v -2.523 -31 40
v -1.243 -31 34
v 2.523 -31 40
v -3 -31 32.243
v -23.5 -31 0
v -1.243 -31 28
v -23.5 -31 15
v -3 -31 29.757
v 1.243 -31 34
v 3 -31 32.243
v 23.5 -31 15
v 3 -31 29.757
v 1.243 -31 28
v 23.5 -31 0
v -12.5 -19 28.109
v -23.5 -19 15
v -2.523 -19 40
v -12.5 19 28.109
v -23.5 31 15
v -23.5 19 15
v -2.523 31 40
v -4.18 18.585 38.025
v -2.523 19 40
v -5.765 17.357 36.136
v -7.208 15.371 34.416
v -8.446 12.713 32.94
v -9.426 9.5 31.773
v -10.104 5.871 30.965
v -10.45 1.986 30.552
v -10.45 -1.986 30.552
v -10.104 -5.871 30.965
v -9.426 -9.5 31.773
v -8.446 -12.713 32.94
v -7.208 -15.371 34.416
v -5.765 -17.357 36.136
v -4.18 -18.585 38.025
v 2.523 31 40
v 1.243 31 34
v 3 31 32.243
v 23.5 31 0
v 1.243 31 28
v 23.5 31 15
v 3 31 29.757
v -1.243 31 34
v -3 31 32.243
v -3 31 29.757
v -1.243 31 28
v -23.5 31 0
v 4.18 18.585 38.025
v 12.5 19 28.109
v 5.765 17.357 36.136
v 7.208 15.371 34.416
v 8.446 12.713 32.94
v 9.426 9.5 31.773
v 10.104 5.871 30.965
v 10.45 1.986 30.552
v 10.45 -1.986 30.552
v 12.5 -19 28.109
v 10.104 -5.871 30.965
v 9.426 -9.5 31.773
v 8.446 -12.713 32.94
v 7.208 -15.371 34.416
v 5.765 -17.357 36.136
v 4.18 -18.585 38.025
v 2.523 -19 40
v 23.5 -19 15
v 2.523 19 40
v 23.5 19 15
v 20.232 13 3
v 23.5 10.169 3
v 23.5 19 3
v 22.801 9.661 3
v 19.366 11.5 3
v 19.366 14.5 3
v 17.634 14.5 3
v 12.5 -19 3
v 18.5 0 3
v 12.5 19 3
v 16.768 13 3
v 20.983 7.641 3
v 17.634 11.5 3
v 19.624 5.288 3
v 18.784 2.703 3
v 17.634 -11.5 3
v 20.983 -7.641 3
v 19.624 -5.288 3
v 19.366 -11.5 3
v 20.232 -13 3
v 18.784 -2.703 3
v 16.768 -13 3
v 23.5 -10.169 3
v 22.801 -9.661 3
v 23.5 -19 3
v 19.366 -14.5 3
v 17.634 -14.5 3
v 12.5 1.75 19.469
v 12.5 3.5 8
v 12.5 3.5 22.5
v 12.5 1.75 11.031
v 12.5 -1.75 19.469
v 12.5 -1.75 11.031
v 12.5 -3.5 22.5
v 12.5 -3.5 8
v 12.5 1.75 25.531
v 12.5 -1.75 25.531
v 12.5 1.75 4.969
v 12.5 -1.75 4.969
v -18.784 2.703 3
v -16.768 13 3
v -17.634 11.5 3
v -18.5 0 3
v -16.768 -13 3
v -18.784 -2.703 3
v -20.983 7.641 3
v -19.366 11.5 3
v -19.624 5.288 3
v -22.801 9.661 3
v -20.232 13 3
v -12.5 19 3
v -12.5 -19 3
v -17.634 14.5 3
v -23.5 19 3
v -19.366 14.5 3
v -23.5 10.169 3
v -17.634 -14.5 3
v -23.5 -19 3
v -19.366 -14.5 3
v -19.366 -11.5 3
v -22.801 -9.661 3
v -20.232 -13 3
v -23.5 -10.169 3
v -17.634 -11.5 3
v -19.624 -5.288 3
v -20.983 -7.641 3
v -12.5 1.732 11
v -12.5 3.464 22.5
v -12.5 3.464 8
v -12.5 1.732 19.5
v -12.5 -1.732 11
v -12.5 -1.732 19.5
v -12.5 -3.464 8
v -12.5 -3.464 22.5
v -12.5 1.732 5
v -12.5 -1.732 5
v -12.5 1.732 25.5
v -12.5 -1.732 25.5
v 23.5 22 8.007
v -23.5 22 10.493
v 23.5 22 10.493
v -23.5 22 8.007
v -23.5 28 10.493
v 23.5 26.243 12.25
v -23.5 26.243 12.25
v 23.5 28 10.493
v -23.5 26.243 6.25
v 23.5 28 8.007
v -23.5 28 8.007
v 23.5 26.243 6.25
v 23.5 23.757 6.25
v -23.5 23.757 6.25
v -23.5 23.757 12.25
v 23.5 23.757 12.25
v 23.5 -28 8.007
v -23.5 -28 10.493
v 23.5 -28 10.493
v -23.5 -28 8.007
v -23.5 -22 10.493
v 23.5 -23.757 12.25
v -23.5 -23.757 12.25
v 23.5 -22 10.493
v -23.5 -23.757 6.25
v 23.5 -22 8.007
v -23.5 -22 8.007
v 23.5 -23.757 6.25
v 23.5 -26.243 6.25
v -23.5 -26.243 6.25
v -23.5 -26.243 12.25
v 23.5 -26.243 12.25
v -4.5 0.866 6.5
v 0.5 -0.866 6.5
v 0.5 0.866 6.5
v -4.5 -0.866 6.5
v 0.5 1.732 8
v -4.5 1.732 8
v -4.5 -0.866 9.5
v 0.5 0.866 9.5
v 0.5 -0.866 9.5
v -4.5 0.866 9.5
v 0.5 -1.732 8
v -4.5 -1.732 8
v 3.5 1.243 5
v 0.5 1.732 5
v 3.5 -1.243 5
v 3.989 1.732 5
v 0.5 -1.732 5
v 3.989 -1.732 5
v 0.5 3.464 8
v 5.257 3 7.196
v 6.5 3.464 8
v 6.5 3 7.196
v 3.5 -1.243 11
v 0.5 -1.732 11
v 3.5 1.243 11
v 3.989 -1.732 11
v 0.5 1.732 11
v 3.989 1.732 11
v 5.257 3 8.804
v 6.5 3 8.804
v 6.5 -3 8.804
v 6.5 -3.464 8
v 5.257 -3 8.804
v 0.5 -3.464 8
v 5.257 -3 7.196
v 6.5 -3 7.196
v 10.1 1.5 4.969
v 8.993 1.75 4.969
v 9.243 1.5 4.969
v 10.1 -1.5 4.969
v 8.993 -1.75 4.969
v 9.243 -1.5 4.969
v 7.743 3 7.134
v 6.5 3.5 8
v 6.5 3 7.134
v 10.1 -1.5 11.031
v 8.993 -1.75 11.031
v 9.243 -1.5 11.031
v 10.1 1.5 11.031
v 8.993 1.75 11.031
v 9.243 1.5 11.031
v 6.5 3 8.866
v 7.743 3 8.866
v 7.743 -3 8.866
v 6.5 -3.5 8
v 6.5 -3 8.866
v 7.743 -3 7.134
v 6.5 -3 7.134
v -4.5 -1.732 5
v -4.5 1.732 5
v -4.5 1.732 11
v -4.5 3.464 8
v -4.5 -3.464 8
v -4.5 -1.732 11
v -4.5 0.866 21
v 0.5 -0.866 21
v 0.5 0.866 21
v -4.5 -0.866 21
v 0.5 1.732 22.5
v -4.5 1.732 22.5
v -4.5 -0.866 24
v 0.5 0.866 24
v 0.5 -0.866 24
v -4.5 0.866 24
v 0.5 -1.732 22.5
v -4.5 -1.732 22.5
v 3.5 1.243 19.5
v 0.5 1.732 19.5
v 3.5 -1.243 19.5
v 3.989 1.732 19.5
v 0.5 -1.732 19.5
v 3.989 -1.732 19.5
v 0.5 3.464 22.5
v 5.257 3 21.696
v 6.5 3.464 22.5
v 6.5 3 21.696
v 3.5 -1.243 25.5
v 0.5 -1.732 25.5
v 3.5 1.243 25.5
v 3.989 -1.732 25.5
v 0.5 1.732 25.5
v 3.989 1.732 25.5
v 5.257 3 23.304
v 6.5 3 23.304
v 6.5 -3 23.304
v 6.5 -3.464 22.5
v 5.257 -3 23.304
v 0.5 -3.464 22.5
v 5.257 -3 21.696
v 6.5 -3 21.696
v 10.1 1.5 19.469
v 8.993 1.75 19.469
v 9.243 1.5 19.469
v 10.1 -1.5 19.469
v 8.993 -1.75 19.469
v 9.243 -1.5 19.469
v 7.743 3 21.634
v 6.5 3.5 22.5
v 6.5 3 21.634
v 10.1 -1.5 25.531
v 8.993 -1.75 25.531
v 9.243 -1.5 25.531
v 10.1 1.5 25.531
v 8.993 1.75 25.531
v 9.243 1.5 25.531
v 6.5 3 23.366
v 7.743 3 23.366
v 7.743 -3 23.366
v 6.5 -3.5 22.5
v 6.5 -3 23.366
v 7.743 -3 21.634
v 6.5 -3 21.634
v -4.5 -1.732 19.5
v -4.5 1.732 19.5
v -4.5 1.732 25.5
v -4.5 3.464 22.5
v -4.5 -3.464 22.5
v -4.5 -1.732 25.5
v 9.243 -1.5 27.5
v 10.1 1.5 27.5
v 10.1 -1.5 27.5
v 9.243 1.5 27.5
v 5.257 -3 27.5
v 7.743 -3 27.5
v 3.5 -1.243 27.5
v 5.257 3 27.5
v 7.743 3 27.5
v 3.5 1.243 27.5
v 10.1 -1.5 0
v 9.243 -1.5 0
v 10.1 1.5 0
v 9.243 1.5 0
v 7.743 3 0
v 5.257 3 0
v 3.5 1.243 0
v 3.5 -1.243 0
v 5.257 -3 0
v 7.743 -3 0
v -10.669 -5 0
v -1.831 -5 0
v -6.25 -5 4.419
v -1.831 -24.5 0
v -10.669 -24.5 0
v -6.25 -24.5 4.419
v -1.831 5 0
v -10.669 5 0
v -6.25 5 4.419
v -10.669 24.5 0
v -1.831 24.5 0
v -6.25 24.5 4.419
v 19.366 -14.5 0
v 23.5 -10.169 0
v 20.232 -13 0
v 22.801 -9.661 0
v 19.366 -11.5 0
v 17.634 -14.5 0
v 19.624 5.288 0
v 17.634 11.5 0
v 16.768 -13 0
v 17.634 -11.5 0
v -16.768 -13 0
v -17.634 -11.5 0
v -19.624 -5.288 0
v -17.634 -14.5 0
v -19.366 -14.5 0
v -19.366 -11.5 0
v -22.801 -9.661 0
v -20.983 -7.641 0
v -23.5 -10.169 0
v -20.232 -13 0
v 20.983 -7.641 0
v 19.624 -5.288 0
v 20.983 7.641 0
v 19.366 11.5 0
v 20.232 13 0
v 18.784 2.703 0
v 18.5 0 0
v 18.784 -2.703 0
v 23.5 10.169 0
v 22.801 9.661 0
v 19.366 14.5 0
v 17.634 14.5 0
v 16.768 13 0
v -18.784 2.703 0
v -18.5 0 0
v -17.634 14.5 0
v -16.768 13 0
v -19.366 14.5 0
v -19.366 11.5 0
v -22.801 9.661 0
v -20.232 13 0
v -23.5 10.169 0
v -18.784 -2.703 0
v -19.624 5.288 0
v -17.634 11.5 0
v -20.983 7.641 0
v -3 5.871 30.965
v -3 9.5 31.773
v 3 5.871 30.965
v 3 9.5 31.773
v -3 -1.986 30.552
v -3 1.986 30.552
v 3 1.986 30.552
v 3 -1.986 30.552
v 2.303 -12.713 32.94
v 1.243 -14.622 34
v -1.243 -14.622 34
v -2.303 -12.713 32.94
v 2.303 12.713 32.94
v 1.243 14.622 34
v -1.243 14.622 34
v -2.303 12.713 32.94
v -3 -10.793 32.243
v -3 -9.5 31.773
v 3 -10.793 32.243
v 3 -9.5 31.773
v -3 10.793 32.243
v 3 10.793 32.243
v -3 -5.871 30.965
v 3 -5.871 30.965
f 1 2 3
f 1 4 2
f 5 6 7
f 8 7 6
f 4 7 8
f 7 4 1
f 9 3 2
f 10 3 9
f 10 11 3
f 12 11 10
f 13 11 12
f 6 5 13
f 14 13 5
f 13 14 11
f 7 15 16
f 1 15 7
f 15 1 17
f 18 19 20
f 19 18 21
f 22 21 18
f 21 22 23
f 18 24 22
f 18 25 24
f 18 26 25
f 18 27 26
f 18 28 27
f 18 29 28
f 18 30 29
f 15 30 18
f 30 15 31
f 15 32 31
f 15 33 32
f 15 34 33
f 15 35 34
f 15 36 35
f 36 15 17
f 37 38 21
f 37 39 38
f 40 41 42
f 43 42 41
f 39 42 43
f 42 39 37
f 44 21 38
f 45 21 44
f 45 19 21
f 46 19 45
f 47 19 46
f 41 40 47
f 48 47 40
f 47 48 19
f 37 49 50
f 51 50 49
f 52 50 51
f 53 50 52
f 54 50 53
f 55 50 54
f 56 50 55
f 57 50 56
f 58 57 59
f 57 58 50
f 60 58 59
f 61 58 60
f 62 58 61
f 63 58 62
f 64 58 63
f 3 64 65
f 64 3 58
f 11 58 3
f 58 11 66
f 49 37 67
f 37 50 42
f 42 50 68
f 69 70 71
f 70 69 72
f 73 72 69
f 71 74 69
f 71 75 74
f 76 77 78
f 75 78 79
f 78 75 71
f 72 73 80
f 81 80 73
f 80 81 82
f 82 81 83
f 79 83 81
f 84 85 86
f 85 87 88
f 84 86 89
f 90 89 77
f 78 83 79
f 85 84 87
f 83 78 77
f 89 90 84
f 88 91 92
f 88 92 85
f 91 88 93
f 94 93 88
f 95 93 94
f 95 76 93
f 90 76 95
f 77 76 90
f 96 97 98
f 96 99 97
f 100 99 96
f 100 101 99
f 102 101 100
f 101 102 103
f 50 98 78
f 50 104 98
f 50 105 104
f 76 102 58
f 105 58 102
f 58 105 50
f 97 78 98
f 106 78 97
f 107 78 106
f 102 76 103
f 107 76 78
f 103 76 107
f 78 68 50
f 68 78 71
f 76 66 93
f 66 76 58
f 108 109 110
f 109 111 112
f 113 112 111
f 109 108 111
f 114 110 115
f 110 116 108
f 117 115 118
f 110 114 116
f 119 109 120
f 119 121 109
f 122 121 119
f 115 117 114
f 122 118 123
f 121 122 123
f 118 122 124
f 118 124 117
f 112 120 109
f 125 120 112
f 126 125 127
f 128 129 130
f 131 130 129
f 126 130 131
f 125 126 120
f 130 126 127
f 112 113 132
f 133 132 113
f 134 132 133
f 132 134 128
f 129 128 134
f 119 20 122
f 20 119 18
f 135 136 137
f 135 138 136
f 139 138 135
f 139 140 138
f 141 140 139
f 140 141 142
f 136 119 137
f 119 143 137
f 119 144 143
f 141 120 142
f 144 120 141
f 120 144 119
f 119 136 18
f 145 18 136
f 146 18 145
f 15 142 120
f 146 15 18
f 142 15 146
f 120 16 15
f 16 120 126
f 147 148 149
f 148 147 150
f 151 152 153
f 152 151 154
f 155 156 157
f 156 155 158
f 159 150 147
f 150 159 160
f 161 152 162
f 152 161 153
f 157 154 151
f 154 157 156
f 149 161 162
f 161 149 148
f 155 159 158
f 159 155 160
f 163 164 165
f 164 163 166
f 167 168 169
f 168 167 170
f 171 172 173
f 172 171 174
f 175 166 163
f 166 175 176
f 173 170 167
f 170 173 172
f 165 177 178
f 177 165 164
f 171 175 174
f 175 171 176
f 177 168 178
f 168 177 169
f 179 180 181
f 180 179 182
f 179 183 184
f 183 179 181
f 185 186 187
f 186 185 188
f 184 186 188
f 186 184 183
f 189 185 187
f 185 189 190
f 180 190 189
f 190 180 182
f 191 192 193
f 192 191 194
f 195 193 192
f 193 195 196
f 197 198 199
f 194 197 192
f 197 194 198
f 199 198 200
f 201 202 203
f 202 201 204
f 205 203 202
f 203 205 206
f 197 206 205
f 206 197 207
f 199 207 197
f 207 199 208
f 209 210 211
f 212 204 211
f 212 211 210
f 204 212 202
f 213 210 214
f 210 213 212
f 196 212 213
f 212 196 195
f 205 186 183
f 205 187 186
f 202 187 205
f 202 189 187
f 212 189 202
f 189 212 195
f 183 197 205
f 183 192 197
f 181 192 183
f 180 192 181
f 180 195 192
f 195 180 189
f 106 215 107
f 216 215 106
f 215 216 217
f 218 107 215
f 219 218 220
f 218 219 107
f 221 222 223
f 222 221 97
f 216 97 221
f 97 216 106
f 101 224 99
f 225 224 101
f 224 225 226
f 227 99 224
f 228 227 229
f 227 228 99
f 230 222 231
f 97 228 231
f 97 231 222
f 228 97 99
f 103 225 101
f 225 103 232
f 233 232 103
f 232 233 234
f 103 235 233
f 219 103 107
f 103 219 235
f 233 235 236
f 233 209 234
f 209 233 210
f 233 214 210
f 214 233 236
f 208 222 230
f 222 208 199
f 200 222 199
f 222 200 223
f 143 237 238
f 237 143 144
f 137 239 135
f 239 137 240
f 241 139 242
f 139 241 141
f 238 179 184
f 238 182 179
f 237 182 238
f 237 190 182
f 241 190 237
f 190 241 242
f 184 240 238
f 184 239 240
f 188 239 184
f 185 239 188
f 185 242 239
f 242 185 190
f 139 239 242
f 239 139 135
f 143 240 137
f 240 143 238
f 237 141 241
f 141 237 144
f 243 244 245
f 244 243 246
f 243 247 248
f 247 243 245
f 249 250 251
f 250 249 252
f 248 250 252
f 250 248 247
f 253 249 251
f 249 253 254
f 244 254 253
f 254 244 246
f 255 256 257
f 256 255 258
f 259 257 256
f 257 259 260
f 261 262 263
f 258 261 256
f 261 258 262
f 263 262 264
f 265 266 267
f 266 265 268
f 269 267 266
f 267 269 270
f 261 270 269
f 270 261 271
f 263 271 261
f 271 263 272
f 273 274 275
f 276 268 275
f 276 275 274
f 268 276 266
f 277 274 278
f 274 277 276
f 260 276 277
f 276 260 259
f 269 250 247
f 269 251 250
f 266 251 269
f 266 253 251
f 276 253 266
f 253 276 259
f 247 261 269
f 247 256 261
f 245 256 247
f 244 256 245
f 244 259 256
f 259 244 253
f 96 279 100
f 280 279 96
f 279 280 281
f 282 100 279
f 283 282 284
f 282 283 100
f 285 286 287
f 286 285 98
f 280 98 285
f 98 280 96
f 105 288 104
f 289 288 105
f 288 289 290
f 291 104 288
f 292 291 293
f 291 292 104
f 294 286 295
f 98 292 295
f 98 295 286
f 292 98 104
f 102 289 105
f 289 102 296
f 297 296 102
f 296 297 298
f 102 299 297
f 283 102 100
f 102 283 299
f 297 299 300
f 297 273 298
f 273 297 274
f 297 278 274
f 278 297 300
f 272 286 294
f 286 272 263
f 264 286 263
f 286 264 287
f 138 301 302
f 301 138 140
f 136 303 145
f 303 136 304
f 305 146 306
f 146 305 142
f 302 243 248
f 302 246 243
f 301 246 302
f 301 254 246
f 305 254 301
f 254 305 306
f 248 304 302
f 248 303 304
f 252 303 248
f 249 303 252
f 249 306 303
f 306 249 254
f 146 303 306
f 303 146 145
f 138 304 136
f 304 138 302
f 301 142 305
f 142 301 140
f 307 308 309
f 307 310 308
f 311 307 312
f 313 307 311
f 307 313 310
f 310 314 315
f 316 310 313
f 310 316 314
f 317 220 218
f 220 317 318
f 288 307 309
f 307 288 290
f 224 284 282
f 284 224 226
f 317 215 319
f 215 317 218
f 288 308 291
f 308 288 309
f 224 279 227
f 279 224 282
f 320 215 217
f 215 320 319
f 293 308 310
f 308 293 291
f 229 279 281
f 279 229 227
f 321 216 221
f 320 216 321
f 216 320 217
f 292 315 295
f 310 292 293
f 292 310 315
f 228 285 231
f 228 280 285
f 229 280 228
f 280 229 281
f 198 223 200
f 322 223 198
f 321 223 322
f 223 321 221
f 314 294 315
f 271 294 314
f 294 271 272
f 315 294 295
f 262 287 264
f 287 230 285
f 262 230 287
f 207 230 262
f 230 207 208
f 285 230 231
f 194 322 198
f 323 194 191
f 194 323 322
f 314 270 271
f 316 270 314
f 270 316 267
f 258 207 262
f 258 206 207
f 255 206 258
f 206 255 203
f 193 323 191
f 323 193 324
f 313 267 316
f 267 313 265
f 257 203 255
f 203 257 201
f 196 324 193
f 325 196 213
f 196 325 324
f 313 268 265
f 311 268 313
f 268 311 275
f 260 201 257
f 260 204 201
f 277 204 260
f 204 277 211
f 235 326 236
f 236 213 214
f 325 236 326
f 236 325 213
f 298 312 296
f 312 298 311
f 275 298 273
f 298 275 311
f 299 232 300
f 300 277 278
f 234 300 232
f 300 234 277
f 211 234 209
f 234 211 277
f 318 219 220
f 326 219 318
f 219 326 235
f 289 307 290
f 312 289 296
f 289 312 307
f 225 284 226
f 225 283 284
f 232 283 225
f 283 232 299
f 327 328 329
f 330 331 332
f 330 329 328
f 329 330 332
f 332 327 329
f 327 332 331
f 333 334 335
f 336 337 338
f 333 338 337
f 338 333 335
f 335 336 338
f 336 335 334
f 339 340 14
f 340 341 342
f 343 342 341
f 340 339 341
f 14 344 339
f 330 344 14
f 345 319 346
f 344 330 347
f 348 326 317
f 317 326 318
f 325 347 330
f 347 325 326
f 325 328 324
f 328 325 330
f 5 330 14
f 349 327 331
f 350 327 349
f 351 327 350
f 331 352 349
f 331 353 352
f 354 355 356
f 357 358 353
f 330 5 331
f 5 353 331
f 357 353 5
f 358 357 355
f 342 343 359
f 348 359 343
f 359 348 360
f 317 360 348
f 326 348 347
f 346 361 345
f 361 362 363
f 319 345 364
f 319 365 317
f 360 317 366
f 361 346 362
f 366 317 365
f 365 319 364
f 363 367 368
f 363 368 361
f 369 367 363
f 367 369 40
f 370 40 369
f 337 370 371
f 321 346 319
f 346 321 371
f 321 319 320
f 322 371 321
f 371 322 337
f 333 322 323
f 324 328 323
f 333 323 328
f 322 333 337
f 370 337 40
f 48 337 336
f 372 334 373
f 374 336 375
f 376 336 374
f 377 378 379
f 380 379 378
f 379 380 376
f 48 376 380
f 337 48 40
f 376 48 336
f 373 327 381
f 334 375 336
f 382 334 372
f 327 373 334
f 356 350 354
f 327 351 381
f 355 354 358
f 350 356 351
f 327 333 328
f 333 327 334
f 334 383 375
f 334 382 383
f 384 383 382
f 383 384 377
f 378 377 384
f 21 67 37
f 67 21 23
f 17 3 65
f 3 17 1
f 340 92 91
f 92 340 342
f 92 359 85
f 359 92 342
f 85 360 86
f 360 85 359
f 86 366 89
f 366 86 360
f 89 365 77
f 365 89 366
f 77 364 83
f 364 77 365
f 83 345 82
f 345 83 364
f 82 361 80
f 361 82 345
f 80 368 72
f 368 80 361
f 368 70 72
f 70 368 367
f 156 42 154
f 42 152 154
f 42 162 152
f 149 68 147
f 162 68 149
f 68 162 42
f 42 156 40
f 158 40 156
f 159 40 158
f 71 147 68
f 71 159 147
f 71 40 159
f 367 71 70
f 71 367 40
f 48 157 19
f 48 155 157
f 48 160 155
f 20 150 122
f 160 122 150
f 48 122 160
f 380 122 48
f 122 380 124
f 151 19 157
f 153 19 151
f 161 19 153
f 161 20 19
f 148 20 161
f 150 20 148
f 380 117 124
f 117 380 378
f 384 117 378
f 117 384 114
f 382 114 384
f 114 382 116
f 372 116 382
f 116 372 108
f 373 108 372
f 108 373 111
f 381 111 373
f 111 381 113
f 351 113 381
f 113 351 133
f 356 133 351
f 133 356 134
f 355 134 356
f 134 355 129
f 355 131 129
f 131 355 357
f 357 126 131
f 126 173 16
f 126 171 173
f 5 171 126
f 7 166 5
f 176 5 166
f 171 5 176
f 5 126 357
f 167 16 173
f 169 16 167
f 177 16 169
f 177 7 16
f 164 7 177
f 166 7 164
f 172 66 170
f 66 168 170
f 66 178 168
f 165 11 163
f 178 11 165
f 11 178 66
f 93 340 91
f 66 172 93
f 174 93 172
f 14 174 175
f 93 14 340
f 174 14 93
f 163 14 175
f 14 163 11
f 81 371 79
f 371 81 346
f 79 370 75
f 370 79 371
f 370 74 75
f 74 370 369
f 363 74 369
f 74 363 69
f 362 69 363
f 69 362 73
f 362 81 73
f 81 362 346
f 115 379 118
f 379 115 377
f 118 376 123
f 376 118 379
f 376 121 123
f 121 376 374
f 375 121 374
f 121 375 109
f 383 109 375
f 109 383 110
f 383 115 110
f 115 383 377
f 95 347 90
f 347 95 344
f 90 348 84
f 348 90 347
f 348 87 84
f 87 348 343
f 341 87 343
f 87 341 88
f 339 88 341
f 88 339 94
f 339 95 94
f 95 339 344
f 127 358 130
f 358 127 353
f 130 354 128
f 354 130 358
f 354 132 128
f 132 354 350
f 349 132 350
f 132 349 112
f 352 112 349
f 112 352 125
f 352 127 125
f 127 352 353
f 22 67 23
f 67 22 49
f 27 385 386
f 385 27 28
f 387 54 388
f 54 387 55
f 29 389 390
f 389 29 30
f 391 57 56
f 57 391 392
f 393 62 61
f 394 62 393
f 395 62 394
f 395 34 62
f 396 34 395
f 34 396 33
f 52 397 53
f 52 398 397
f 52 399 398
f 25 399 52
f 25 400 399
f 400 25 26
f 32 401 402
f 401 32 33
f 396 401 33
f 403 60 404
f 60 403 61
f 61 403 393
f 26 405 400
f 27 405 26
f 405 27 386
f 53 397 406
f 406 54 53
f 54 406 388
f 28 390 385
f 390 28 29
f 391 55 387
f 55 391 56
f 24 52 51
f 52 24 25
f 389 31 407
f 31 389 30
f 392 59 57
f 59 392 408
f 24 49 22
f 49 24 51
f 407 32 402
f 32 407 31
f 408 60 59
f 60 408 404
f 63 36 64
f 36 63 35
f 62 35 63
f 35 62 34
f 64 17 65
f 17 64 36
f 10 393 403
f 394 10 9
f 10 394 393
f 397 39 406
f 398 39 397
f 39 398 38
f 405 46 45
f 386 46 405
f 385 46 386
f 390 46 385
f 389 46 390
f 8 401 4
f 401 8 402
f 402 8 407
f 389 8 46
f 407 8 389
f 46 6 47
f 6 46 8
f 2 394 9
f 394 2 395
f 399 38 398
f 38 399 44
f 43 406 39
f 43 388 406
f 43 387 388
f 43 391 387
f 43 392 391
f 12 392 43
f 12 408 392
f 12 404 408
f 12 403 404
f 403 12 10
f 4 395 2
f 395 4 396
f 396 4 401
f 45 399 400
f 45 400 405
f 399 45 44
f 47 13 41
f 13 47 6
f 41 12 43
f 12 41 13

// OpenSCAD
rod_size = 6;
rod_nut_size = 12; //12 for M6, 15 for M8
bearing_size = 12.5; //12.5 for LM6UU, 15.5 for LM8UU,LM8SUU
bearing_length = 19.5; //19.5 for LM6UU, 17.5 for LM8SUU, 24.5 for LM8UU
yz_motor_distance = 25;
motor_screw_spacing = 26; //26 for NEMA14, 31 for NEMA17
motor_casing = 38; //38 for NEMA14, 45 for NEMA17
end_height = 40; //measure the height of your motor casing and add 4mm. Suggestion: 40 for NEMA14, 55 for NEMA17
bed_mount_height = 16;
//x_rod_spacing = motor_screw_spacing + 3 + rod_size;
x_rod_spacing = 30;
x_carriage_width = 70;
carriage_extruder_offset = 5;
pulley_size = 20;
idler_pulley_width = 10;
gusset_size = 15;
m3_size = 3;
m3_nut_size = 6;
m4_size = 4;
motor_shaft_size = 5;

// ratio for converting diameter to apothem
da6 = 1 / cos(180 / 6) / 2;
da8 = 1 / cos(180 / 8) / 2;

//Comment out all of the lines in the following section to render the assembled machine. Uncomment one of them to export that part for printing. You can also use the individual files to export each part.

!base_end();
//!for(b = [0:1]) mirror([0, b, 0]) for(a = [-1,1]) translate([a * bearing_size / 4, bearing_size - (bearing_size * 2/3) * a, 0]) rotate(90 + 90 * a) y_bearing_retainer();
//!for(b = [0:1]) mirror([0, b, 0]) for(a = [-1,1]) translate([a * -7.5, 18 - 5 * a, 0]) rotate(180 + 90 * a) bed_mount();
//!x_end(2);
//!x_end(0);
//!x_carriage();
//!for(side = [-1,1]) translate([0, side * motor_screw_spacing / 2, 0]) leadscrew_coupler();
//!y_idler();
//!for(x = [1, -1]) for(y = [1, -1]) translate([x * (pulley_size / 2 + 3), y * (pulley_size / 2 + 3), 0]) idler_pulley(true);
//!for(x = [1, -1]) for(y = [1, -1]) translate([x * (rod_size * 1.5 + 2), y * (rod_size * 1.5 + 2), 0]) foot();
//!for(side = [0, 1]) mirror([side, 0, 0]) translate([-rod_size * 2.5, 0, 0]) z_top_clamp();


//The following section positions parts for rendering the assembled machine.

	translate([0, 0, -bearing_size]) rotate([0, 180, 0]) base_end();
	translate([200, 0, -bearing_size]) rotate([0, 180,180]) base_end(false);
	for(end = [1]) translate([0, end * motor_screw_spacing / 2 + 5, -bearing_size + bearing_size * sqrt(2) / 4]) rotate([-90, 0, 180]) y_bearing_retainer();
	translate([200, -( motor_screw_spacing / 2 + 5), -bearing_size + bearing_size * sqrt(2) / 4]) rotate([-90, 0, 0]) y_bearing_retainer_slim();
	translate([200, ( motor_screw_spacing / 2 + 5), -bearing_size + bearing_size * sqrt(2) / 4]) mirror([0,1,0]) rotate([-90, 0, 0]) y_bearing_retainer_slim();
	for(side = [0, 1]) mirror([0, side, 0]) translate([yz_motor_distance / 2 - bearing_size / 2, -motor_casing / 2 - rod_size * 2 - 10, -bearing_size + bearing_size * sqrt(2) / 4]) rotate([90, 0, 0]) bed_mount();
	translate([-yz_motor_distance / 2 + rod_size - motor_casing / 4 - rod_size / 2, 0, 60 + (x_rod_spacing + 8 + rod_size) / 2]) rotate([0, 180, 0]) x_end(0);
	translate([140, 0, 60 + (x_rod_spacing + 8 + rod_size) / 2]) rotate([0, 180, 0]) {
		x_end(2);
		translate([0, 8 + rod_size, 0]) rotate([90, 0, 0]) translate([0, (x_rod_spacing + 8 + rod_size) / 2, rod_size / 2 - 2 - bearing_size / 2 - 4 - idler_pulley_width - 1.5]) idler_pulley(true);
	}
translate([40, rod_size + bearing_size / 2 + 1 - rod_size / 2 + 2, 60]) {
		rotate([90, 0, 90]) x_carriage();
		translate([x_carriage_width / 2 + carriage_extruder_offset, -14 - bearing_size / 2 - 4, x_rod_spacing / 2 + bearing_size / 2 + 4]) {
			rotate([90, 0, 180]) translate([10.57, 30.3, -14]) import("gregs/gregs_accessible_wade-wildseyed_mount.stl", convexity = 5);
			%rotate(180 / 8) cylinder(r = 2, h = 150, center = true, $fn = 8);
		}
	}
	translate([-yz_motor_distance / 2 - motor_casing / 2, 0, -bearing_size / 2]) leadscrew_coupler();
	translate([60, 0, -bearing_size - rod_size / 2 - bearing_size / 2]) {
		rotate([0, 90, 0]) y_idler();
		for(side = [1, -1]) translate([5, side * (motor_casing / 2 - rod_size / 2), idler_pulley_width + 1.5 + rod_size]) rotate([180, 0, 0]) idler_pulley(true);
	}
	for(side = [0, 1]) mirror([0, side, 0]) translate([0, -motor_casing / 2 - rod_size * 2 - 10, -bearing_size - end_height + rod_size * 1.5]) rotate([90, 0, 0]) foot();
	translate([-yz_motor_distance / 2 + rod_size, 0, 210 - end_height]) rotate([180, 0, 90]) z_top_clamp(0);






module z_top_clamp() difference() {
	union() {
		linear_extrude(height = rod_size * 2 + gusset_size, convexity = 5) difference() {
			union() {
				circle(r = rod_size * da6 * 2, $fn = 6);
				translate([0, -rod_size, 0]) square([rod_size * (1 + da6), rod_size * 2]);
				translate([rod_size - rod_size * da6, rod_size / 2, rod_size]) square([rod_size * da6 * 2, rod_size / 2 + gusset_size]);
			}
		}
		translate([rod_size, -rod_size - 1, rod_size]) rotate([-90, 0, 0]) cylinder(r = rod_size / cos(180 / 6), h = rod_size * 2 + gusset_size + 2, $fn = 6);
	}
	translate([rod_size, -rod_size - 2, rod_size]) rotate([-90, 0, 0]) cylinder(r = rod_size * da6, h = gusset_size + rod_size * 2 + 4, $fn = 6);
	translate([rod_size, rod_size + gusset_size, rod_size * 2 + gusset_size]) rotate([45, 0, 0]) cube([rod_size * 2, gusset_size * sqrt(2), gusset_size * sqrt(2)], center = true);
	translate([0, 0, -1]) linear_extrude(height = rod_size * 2 + gusset_size + 2, convexity = 5) {
		circle(r = rod_size * da6, $fn = 6);
		%translate([rod_size, -10, rod_size * da6 * 2]) rotate([-90, 0, 0]) cylinder(r = rod_size * da6, h = 160, $fn = 6);
		translate([0, -rod_size / 2, 0]) square([gusset_size + rod_size * 2 + 1, rod_size]);
	}
}

module foot() difference() {
	linear_extrude(height = rod_size, convexity = 5) difference() {
		minkowski() {
			square(rod_size + 2, center = true);
			circle(rod_size, $fn = 16);
		}
		circle(rod_size / 2, $fn = 12);
	}
	translate([0, 0, -rod_size / 16]) cylinder(r1 = rod_size * 3/4, r2 = rod_size / 4, h = rod_size / 2, $fn = 12);
	translate([0, 0, rod_size / 2 + rod_size / 16]) cylinder(r2 = rod_size * 3/4, r1 = rod_size / 4, h = rod_size / 2, $fn = 12);
}

module idler_pulley(double_bearing = true) difference() {
	intersection() {
		linear_extrude(height = idler_pulley_width + 1, convexity = 5) difference() {
			circle(pulley_size / 2 + 2);
			circle(5, $fn = 4);
		}
		union() {
			translate([0, 0, idler_pulley_width / 2 + 1]) scale([1, 1, 1.25]) sphere(pulley_size / 2);
			cylinder(r = pulley_size / 2 + 5, h = 1);
		}
	}
	for(h = [-idler_pulley_width + 4, idler_pulley_width * 2 + 1 - 4]) rotate(180 / 8) translate([0, 0, (double_bearing) ? h:0]) cylinder(r = 10 * da8, h = idler_pulley_width * 2, center = true, $fn = 8);
}

module y_idler() difference() {
	linear_extrude(height = 10, convexity = 5) difference() {
		union() {
			square([rod_size * 2, motor_casing + rod_size * 2], center = true);
			for(side = [1, -1]) translate([0, side * (motor_casing / 2 + rod_size), rod_size / 2 + bearing_size / 2]) rotate(180 / 8) circle(rod_size * 13/12, h = yz_motor_distance + motor_casing + 20, center = true, $fn = 8);
		}
		for(side = [1, -1]) translate([0, side * (motor_casing / 2 + rod_size), rod_size / 2 + bearing_size / 2]) rotate(180 / 8) circle(rod_size * da8, h = yz_motor_distance + motor_casing + 20, center = true, $fn = 8);

	}
	rotate([90, 0, 90]) {
		for(side = [1, -1]) translate([side * (motor_casing / 2 - rod_size / 2), 5, -3]) {
			cylinder(r = m3_size * da6, h = rod_size * 2, center = true, $fn = 6);
			translate([0, 0, rod_size]) cylinder(r = m3_nut_size * da6, h = 4, $fn = 6);
		}
		//belt
		%translate([0, 5, -rod_size - idler_pulley_width / 2]) linear_extrude(height = 5, center = true, convexity = 5) for(side = [1, 0]) mirror([side, 0, 0]) {
			translate([-(motor_casing / 2 - rod_size / 2), 0, 0]) {
				intersection() {
					difference() {
						circle(pulley_size / 2 + 2);
						circle(pulley_size / 2);
					}
					square(pulley_size);
				}
				rotate(90) difference() {
					translate([2, 0, 0]) square([pulley_size / 2, 40]);
					square([pulley_size / 2, 40]);
				}
				rotate(-90) difference() {
					translate([0, 2, 0]) square([60 - yz_motor_distance / 2 - motor_screw_spacing / 2, pulley_size / 2]);
					square([60, pulley_size / 2]);
				}
			}
			translate([0, -(60 - yz_motor_distance / 2 - motor_screw_spacing / 2), 0]) difference() {
				circle(motor_casing / 2 - rod_size / 2 - pulley_size / 2);
				circle(motor_casing / 2 - rod_size / 2 - pulley_size / 2 - 2);
				translate([-(motor_casing / 2 - rod_size / 2 - pulley_size / 2), 0, 0]) square(motor_casing - rod_size - pulley_size);
			}
		}
	}
}

module leadscrew_coupler() difference() {
	linear_extrude(height = 10 + rod_nut_size / 2 + 1, convexity = 5) difference() {
		circle(motor_screw_spacing / 2 - 1);
		circle(motor_shaft_size * da6, $fn = 6);
	}
	translate([0, 0, m3_nut_size / 2]) rotate([-90, 0, 90]) {
		cylinder(r = m3_size * da6, h = motor_screw_spacing / 2 + 1);
		%rotate(90) cylinder(r = m3_nut_size / 2, h = 5.5, $fn = 6);
		translate([0, 0, 12]) cylinder(r = m3_size * da6 * 2, h = motor_screw_spacing / 2);
		translate([-m3_nut_size / da6 / 4, -m3_nut_size / 2, 0]) cube([m3_nut_size / da6 / 2, m3_nut_size + 1, 5.7]);
	}
	translate([0, 0, 10]) cylinder(r = rod_nut_size / 2, h = rod_nut_size + 1, $fn = 6);
	//translate([0, 0, -1]) cube(100);
}

module x_carriage() difference() {
	intersection() {
		linear_extrude(height = x_carriage_width, convexity = 5) difference() {
			union() {
				square([bearing_size + 8, x_rod_spacing], center = true);
				translate([0, -x_rod_spacing / 2 - bearing_size / 2 - 4, 0]) square([bearing_size / 2 + 4 + 15, x_rod_spacing / 2 + bearing_size / 2 + 4 - 2 - pulley_size / 2]);
				translate([0, -pulley_size / 2, 0]) {
					square([bearing_size / 2 + 4 + 15, 8]);
					translate([bearing_size / 2 + 4 + 15, 4, 0]) circle(4);
				}
				rotate(180) translate([0, -x_rod_spacing / 2 - bearing_size / 2 - 4, 0]) square([bearing_size / 2 + 4 + 28, bearing_size / 2 + 4 + 3]);
				for(side = [1, -1]) translate([0, side * x_rod_spacing / 2, 0]) circle(bearing_size / 2 + 4, $fn = 30);
			}
			translate([bearing_size / 2 + 4, 2 - pulley_size / 2, 0]) {
				square([15, 4]);
				translate([0, -3, 0]) square([2, 4]);
				translate([15, 2, 0]) circle(2);
			}
			for(side = [1, -1]) translate([0, side * x_rod_spacing / 2, 0]) {
				circle(bearing_size / 2 -1, $fn = 30);
				rotate(90 * side) square([2, bearing_size / 2 + 40]);
			}
		}
		difference() {
			rotate([0, -90, 0]) linear_extrude(height = bearing_size + 100, convexity = 5, center = true) difference() {
				polygon([
					[
						0,
						(x_rod_spacing / 2 + bearing_size / 2 + 4)
					],[
						0,
						-(x_rod_spacing / 2 + bearing_size / 2 + 4)
					],[
						bearing_length + 4,
						-(x_rod_spacing / 2 + bearing_size / 2 + 4)
					],[
						bearing_length + 4,
						-(x_rod_spacing / 2 - bearing_size / 2 - 4)
					],[
						x_carriage_width,
						(x_rod_spacing / 2 - bearing_size / 2 - 4)
					],[
						x_carriage_width,
						(x_rod_spacing / 2 + bearing_size / 2 + 4)
					]
				]);
			}
			translate([bearing_size / 2 + 4, -50, bearing_length + 4]) cube(100);
		}
	}
	// linear bearings
	translate([0, x_rod_spacing / 2, 0]) rotate([0, 0, 0]) {
		%translate([0, 0, 20]) rotate(180 / 8) cylinder(r = rod_size * da8, h = 200, center = true, $fn = 8);
		for(end = [0, 1]) mirror([0, 0, end]) translate([0, 0, end * -x_carriage_width - 1]) cylinder(r = bearing_size / 2, h = bearing_length, $fn = 30);
	}
	translate([0, -x_rod_spacing / 2, 0]) rotate([0, 0, 0]) {
		translate([0, 0, 4]) cylinder(r = bearing_size / 2, h = x_carriage_width + 1, center = false, $fn = 30);
		%translate([0, 0,20]) rotate(180 / 8) cylinder(r = rod_size * da8, h = 200, center = true, $fn = 8);
	}
	// screw holes
	translate([bearing_size / 2 + 4 + 10, 5 - pulley_size / 2, bearing_length / 2 + 2]) rotate([90, 0, 0]) {
		cylinder(r = m3_size * da6, h = x_rod_spacing + bearing_size + 10, center = true, $fn = 6);
		rotate([180, 0, 0]) cylinder(r = m3_size * da6 * 2, h = x_rod_spacing + bearing_size + 10, center = false, $fn = 6);
		translate([0, 0, x_rod_spacing / 2 + bearing_size / 2 + 6 - pulley_size / 2]) cylinder(r = m3_nut_size * da6, h = x_rod_spacing + bearing_size + 10, center = false, $fn = 6);
	}
	//#for(side = [1, -1]) translate([-bearing_size / 2 - 4 - 14, 0, x_carriage_width / 2 + carriage_extruder_offset + side * 25]) rotate([90, 0, 0]) cylinder(r = 4.1, h = x_rod_spacing - 10, center = true, $fn = 6);
	translate([-bearing_size / 2 - 4 - 14, 0, x_carriage_width / 2 + carriage_extruder_offset]) rotate([90, 0, 0]) linear_extrude(height = bearing_size + x_rod_spacing + 10, center = true, convexity = 5) {
		*translate([-14, 0, 0]) {
			circle(20);
			rotate(45) square(5);
		}
		intersection() {
			translate([18, 0, 0]) rotate(135) square(100);
			translate([-14, 0, 0]) square([56, 100], center = true);
		}
		for(side = [1, -1]) translate([0, side * 25, 0]) circle(m4_size * da6, $fn = 6);
	}
}

module x_end(motor = 0) mirror([(motor == 0) ? 1 : 0, 0, 0]) difference() {
	union() {
		if(motor > 0) translate([-(motor_casing / 2 + rod_size + bearing_size + 8) / 2 - motor_casing, 8 + rod_size, 0]) rotate([90, 0, 0]) {
			// Motor holder
			linear_extrude(height = 7) difference() {
				square([motor_casing + 3, x_rod_spacing + 8 + rod_size]);
				translate([motor_casing / 2, (x_rod_spacing + 8 + rod_size) / 2, 0]) {
					circle(motor_screw_spacing / 2);
					for(x = [1, -1]) for(y = [1, -1]) translate([x * motor_screw_spacing / 2, y * motor_screw_spacing / 2, 0]) circle(m3_size * da6, $fn = 6);
					translate([-(motor_casing * 1.5 - motor_screw_spacing), (motor > 1) ? (motor_casing / 2 - motor_screw_spacing) : 0, 0]) square([motor_casing, x_rod_spacing + 8 + rod_size]);
				}
			}
			// Belt
			%translate([motor_casing / 2, (x_rod_spacing + 8 + rod_size) / 2, rod_size / 2 - 2 - bearing_size / 2 - 2 - idler_pulley_width / 2]) rotate([180, 0, 0]) linear_extrude(height = 5, convexity = 5) difference() {
				union() {
					circle(pulley_size / 2 + 2);
					translate([0, -pulley_size / 2 - 2, 0]) square([200.5, pulley_size + 4]);
					translate([200.5, 0, 0]) circle(pulley_size / 2 + 2);
				}
				circle(pulley_size / 2);
				translate([0, -pulley_size / 2, 0]) square([200.5, pulley_size]);
				translate([200.5, 0, 0]) circle(pulley_size / 2);
			}

		}
		linear_extrude(height = x_rod_spacing + 8 + rod_size, convexity = 5) difference() {
			union() {
				for(side = [1, -1]) translate([side * (motor_casing / 4 + rod_size / 2), 0, 0]) circle(bearing_size / 2 + 3, $fn = 30);
				square([motor_casing / 2 + rod_size, bearing_size / 2 + 3], center = true);
				translate([-(motor_casing / 2 + rod_size + bearing_size + 6) / 2, 0, 0]) square([(motor_casing / 2 + rod_size + bearing_size / 2 + 3 + 3) / 2, bearing_size / 2 + 4 + rod_size / 2]);
				translate([-(motor_casing / 2 + rod_size + bearing_size + 6) / 2, 0, 0]) square([motor_casing / 2 + rod_size + bearing_size / 2 + 3 + 3, bearing_size / 2 + 3 + rod_size / 2]);
				translate([-(motor_casing / 2 + rod_size + bearing_size + 6) / 2 + rod_size / 2 + 2, 0, 0]) square([(motor_casing / 2 + rod_size + bearing_size + 6) / 2 + 5 - rod_size / 2 - 2, bearing_size / 2 + 6 + rod_size]);
				translate([-(motor_casing / 2 + rod_size + bearing_size + 6) / 2 + rod_size / 2 + 2, bearing_size / 2 + rod_size / 2 + 4, 0]) circle(rod_size / 2 + 2);
				translate([0, bearing_size / 2 + rod_size + 6, 0]) square(10, center = true);
			}
			square([motor_casing / 2 + rod_size, 3], center = true);
			translate([(motor_casing / 4 + rod_size / 2), 0, 0]) circle(bearing_size / 2 - 0.5, $fn = 30);
			translate([-(motor_casing / 4 + rod_size / 2), 0, 0]) circle(rod_nut_size * 6/14, $fn = 6);
			translate([4 + rod_size / 2, bearing_size / 2 + rod_size / 2 + 3, 0]) {
				square([motor_casing / 2 + rod_size + bearing_size + 8, rod_size / 2], center = true);
				translate([-(motor_casing / 2 + rod_size + bearing_size + 8) / 2, 0.5, 0]) circle(rod_size / 4 + 0.5, $fn = 12);
			}
		}
	}
	translate([0, 0, (x_rod_spacing + rod_size + 8) / 2]) {
		for(end = [0, 1]) mirror([0, 0, end]) translate([motor_casing / 4 + rod_size / 2, 0, -(x_rod_spacing + rod_size + 8) / 2 - 1]) cylinder(r = bearing_size / 2 - 0.05, h = bearing_length, $fn = 30);
		for(side = [1, -1]) render(convexity = 5) translate([0, bearing_size / 2 + rod_size / 2 + 3, side * x_rod_spacing / 2]) rotate([0, 90, 0]) {
			//cylinder(r = rod_size / 2, h = motor_casing / 2 + rod_size + bearing_size + 10, center = true, $fn = 30);
			difference() {
				translate([0, 0, (motor > -1) ? rod_size / 2 + 2 : 0]) intersection() {
					rotate(45) cube([rod_size + 2, rod_size + 2, motor_casing / 2 + rod_size + bearing_size + 10], center = true);
					cube([rod_size * 2, rod_size + 2, motor_casing / 2 + rod_size + bearing_size + 10], center = true);
				}
				translate([0, rod_size, 0]) cube([rod_size * 2, rod_size * 2, 6], center = true);
				for(end = [1, -1]) translate([0, -rod_size, end * (motor_casing / 4 + rod_size / 2)]) cube([rod_size * 2, rod_size * 2, 6], center = true);
			}
			translate([0, 0, rod_size / 2 + 2]) intersection() {
				rotate(45) cube([rod_size, rod_size, motor_casing / 2 + rod_size + bearing_size + 10], center = true);
				cube([rod_size * 2, rod_size + 1, motor_casing / 2 + rod_size + bearing_size + 10], center = true);
			}
		}
		// holes for clamping screws
		rotate([90, 0, 0]) {
			cylinder(r = m3_size * da6, h = 100, center = true, $fn = 6);
			translate([0, 0, bearing_size / 4 + .5]) cylinder(r = m3_nut_size * da6, h = 100, center = false, $fn = 6);
		}
	}
	translate([-(motor_casing / 4 + rod_size / 2), 0, 5]) rotate(90) cylinder(r = rod_nut_size / 2, h = x_rod_spacing + 8 + rod_size, $fn = 6);
	translate([(motor_casing / 4 + rod_size / 2), 0, 5]) %rotate(180 / 8) cylinder(r = rod_size * da8, h = 200, center = true, $fn = 8);
}

module bed_mount() difference() {
	linear_extrude(height = 10, convexity = 5) difference() {
		union() {
			rotate(180 / 8) circle((rod_size + 8) * da8, $fn = 8);
			translate([0, -rod_size / 2 - 4, 0]) square([rod_size / 2 + 8, max(rod_size + 8, rod_size / 2 + 4 + bed_mount_height)]);
		}
		rotate(180 / 8) circle(rod_size * da8, $fn = 8);
		translate([0, -rod_size / (1 + sqrt(2)) / 2, 0]) square([rod_size + 10, rod_size / (1 + sqrt(2))]);
	}
	translate([rod_size / 2 + 1.5, -rod_size / 2 - 6, 5]) rotate([-90, 0, 0]) {
		cylinder(r = m3_size * da6, h = max(rod_size + 12, rod_size / 2 + 7 + bed_mount_height, $fn = 6));
		cylinder(r = m3_nut_size * da6, h = 4, $fn = 6);
	}
}

module y_bearing_retainer() difference() {
	intersection() {
	difference() {
		linear_extrude(height = motor_screw_spacing + 10, convexity = 5) difference() {
			union() {
				intersection() {
					translate([-yz_motor_distance / 2 + bearing_size / 2, 0, 0]) circle(bearing_size / 2 + 4);
					translate([-yz_motor_distance / 2 + bearing_size / 2 - bearing_size / 2 - 4, -bearing_size, 0]) square([bearing_size + 8, bearing_size]);
				}
				translate([-yz_motor_distance / 2 + bearing_size / 2 - bearing_size / 2 - 4, 0, 0]) square([bearing_size + 8, bearing_size * sqrt(2) / 4 - 1]);
				translate([0, bearing_size * sqrt(2) / 4 - 3, 0]) square([yz_motor_distance + motor_casing - motor_screw_spacing + 10, 4], center = true);
			}
			translate([-yz_motor_distance / 2 + bearing_size / 2, 0, 0]) circle(bearing_size / 2);
			translate([-yz_motor_distance / 2 + bearing_size / 2 - bearing_size / 2, 0, 0]) square(bearing_size);
		}
		for(rh=[1,0]) for(side = [1, -1]) translate([side * (yz_motor_distance + motor_casing - motor_screw_spacing) / 2,0, rh*motor_screw_spacing + 5]) rotate(90) rotate([90, 0, 90]) {
			cylinder(r = 3 * 7/12, h = bearing_size, center = true, $fn = 6);
			translate([0, 0, bearing_size * sqrt(2) / 4 - 5]) rotate([180, 0, 0]) cylinder(r = 3, h = bearing_size, $fn = 30);
		}
	}
	for(sides=[1,0]) translate([0, 0,sides* (motor_screw_spacing) + 5]) rotate(90) rotate([90, 0, 90]) cylinder(r = (yz_motor_distance + motor_casing - motor_screw_spacing + 10) / 2, h = bearing_size + 10, center = true, $fn = 6);
}
	for(ii=[1,0]) translate([-3,5,ii*(motor_screw_spacing+18*2-5)-10]) rotate([90]) cylinder(h=20,r=18);
	translate([6,5,motor_screw_spacing/2+5]) rotate([90]) cylinder(h=20,r=6);
	#translate([20,-5,motor_screw_spacing/2-1]) rotate(90) cube([15,15,12]);
}

module y_bearing_retainer_slim() intersection() {
	difference() {
		translate([0,0,-5]) linear_extrude(height = 15, convexity = 5) difference() {
			union() {
				intersection() {
					translate([-yz_motor_distance / 2 + bearing_size / 2, 0, 0]) circle(bearing_size / 2 + 4);
					translate([-yz_motor_distance / 2 + bearing_size / 2 - bearing_size / 2 - 4, -bearing_size, 0]) square([bearing_size + 8, bearing_size]);
				}
				translate([-yz_motor_distance / 2 + bearing_size / 2 - bearing_size / 2 - 4, 0, 0]) square([bearing_size + 8, bearing_size * sqrt(2) / 4 - 1]);
				translate([0, bearing_size * sqrt(2) / 4 - 3, 0]) square([yz_motor_distance + motor_casing - motor_screw_spacing + 10, 4], center = true);
			}
			translate([-yz_motor_distance / 2 + bearing_size / 2, 0, 0]) circle(bearing_size / 2);
			translate([-yz_motor_distance / 2 + bearing_size / 2 - bearing_size / 2, 0, 0]) square(bearing_size);
		}
		for(side = [1, -1]) translate([side * (yz_motor_distance + motor_casing - motor_screw_spacing) / 2,0,  5]) rotate(90) rotate([90, 0, 90]) {
			cylinder(r = 3 * 7/12, h = bearing_size, center = true, $fn = 6);
			translate([0, 0, bearing_size * sqrt(2) / 4 - 5]) rotate([180, 0, 0]) cylinder(r = 3, h = bearing_size, $fn = 30);
		}
	}
	translate([0, 0,5]) rotate(90) rotate([90, 0, 90]) cylinder(r = (yz_motor_distance + motor_casing - motor_screw_spacing + 10) / 2, h = bearing_size + 10, center = true, $fn = 6);
}

module base_end(single=true) difference() {
	linear_extrude(height = end_height, convexity = 5) difference() {
		square([yz_motor_distance + motor_casing - motor_screw_spacing + 10, motor_casing + rod_size * 4], center = true);
		for(end = [1, -1]) {
			for(side = [1, -1]) translate([end * (yz_motor_distance + motor_casing - motor_screw_spacing) / 2, side * motor_screw_spacing / 2, 0]) circle(m3_size * da6, $fn = 6);
			translate([end * (yz_motor_distance + motor_casing) / 2, 0, 0]) circle(motor_screw_spacing / 2);
		}
	}
	//chamfers
	for(chamfer=[1,0]) mirror([chamfer,0,0]) translate([23.5,-(motor_casing+2*rod_size)/2-rod_size,15]) rotate([0,-40,0]) cube([4*rod_size,motor_casing + rod_size * 4,end_height]);
	for(end = [1, -1]) translate([end * (yz_motor_distance + motor_casing) / 2, 0, 3]) linear_extrude(height = end_height, convexity = 5) square(motor_casing, center = true);
	for(side = [1, -1]) translate([0, side * (motor_casing / 2 + rod_size), rod_size / 2 + bearing_size / 2]) rotate([90, 180 / 8, 90]) {
		cylinder(r = rod_size * da8, h = yz_motor_distance + motor_casing + 20, center = true, $fn = 8);
		%translate([0, 0, -70]) cylinder(r = rod_size * da8, h = 200, center = true, $fn = 8);
	}
	translate([0, 0, end_height]) scale([1, 1, 0.5]) rotate([90, 0, 90]) cylinder(r = motor_casing / 2, h = yz_motor_distance + 20, center = true);
	translate([yz_motor_distance / 2 - rod_size, 0, 0]) {
		translate([0, 0, -3]) linear_extrude(height = end_height - motor_casing / 4, convexity = 5) {
			rotate(180 / 8) circle(rod_size * da8, $fn = 8);
			translate([0, -rod_size / 4, 0]) square([rod_size * .6, rod_size / 2]);
		}
		// z axis clamping
		for(h = [8, end_height - motor_casing / 4 - 8]) translate([0, 0, h]) rotate([90, 0, 90]) {
			cylinder(r = m3_size * da6, h = yz_motor_distance + motor_casing, center = true, $fn = 6);
			translate([0, 0, -rod_size / 2 - 3]) cylinder(r = m3_nut_size* da6, h = yz_motor_distance + motor_casing, $fn = 6);
			translate([0, 0, 0]) cylinder(r = m3_nut_size / 2 + 0.5, h = yz_motor_distance + motor_casing, $fn = 6);
			translate([0, 0, -rod_size / 2 - 8]) rotate([0, 180, 0]) cylinder(r = m3_size * da6 * 2, h = yz_motor_distance + motor_casing, $fn = 6);
		}
	}
	translate([-yz_motor_distance / 2 + bearing_size / 2, 0, -bearing_size * sqrt(2) / 4]) rotate([90, -45, 0]) {
		%cylinder(r = rod_size * da8, h = 100, center = true, $fn = 8);
		for(side = [0, 1]) mirror([0, 0, side]) translate([0, 0, rod_size / 2 + 2]) {
			cylinder(r = bearing_size / 2, h = bearing_length, center = false, $fn = 80);
			cube([bearing_size / 2, bearing_size / 2, bearing_length]);
		}
	}
	translate([0, 0, end_height - rod_size * 1.5]) rotate([90, 180 / 8, 0]) cylinder(r = rod_size * da8, h = motor_casing + rod_size * 5, $fn = 8, center = true);
	%translate([0, 0, end_height - rod_size * 1.5]) rotate([90, 180 / 8, 0]) cylinder(r = rod_size * da8, h = 100, $fn = 8, center = true);
}
